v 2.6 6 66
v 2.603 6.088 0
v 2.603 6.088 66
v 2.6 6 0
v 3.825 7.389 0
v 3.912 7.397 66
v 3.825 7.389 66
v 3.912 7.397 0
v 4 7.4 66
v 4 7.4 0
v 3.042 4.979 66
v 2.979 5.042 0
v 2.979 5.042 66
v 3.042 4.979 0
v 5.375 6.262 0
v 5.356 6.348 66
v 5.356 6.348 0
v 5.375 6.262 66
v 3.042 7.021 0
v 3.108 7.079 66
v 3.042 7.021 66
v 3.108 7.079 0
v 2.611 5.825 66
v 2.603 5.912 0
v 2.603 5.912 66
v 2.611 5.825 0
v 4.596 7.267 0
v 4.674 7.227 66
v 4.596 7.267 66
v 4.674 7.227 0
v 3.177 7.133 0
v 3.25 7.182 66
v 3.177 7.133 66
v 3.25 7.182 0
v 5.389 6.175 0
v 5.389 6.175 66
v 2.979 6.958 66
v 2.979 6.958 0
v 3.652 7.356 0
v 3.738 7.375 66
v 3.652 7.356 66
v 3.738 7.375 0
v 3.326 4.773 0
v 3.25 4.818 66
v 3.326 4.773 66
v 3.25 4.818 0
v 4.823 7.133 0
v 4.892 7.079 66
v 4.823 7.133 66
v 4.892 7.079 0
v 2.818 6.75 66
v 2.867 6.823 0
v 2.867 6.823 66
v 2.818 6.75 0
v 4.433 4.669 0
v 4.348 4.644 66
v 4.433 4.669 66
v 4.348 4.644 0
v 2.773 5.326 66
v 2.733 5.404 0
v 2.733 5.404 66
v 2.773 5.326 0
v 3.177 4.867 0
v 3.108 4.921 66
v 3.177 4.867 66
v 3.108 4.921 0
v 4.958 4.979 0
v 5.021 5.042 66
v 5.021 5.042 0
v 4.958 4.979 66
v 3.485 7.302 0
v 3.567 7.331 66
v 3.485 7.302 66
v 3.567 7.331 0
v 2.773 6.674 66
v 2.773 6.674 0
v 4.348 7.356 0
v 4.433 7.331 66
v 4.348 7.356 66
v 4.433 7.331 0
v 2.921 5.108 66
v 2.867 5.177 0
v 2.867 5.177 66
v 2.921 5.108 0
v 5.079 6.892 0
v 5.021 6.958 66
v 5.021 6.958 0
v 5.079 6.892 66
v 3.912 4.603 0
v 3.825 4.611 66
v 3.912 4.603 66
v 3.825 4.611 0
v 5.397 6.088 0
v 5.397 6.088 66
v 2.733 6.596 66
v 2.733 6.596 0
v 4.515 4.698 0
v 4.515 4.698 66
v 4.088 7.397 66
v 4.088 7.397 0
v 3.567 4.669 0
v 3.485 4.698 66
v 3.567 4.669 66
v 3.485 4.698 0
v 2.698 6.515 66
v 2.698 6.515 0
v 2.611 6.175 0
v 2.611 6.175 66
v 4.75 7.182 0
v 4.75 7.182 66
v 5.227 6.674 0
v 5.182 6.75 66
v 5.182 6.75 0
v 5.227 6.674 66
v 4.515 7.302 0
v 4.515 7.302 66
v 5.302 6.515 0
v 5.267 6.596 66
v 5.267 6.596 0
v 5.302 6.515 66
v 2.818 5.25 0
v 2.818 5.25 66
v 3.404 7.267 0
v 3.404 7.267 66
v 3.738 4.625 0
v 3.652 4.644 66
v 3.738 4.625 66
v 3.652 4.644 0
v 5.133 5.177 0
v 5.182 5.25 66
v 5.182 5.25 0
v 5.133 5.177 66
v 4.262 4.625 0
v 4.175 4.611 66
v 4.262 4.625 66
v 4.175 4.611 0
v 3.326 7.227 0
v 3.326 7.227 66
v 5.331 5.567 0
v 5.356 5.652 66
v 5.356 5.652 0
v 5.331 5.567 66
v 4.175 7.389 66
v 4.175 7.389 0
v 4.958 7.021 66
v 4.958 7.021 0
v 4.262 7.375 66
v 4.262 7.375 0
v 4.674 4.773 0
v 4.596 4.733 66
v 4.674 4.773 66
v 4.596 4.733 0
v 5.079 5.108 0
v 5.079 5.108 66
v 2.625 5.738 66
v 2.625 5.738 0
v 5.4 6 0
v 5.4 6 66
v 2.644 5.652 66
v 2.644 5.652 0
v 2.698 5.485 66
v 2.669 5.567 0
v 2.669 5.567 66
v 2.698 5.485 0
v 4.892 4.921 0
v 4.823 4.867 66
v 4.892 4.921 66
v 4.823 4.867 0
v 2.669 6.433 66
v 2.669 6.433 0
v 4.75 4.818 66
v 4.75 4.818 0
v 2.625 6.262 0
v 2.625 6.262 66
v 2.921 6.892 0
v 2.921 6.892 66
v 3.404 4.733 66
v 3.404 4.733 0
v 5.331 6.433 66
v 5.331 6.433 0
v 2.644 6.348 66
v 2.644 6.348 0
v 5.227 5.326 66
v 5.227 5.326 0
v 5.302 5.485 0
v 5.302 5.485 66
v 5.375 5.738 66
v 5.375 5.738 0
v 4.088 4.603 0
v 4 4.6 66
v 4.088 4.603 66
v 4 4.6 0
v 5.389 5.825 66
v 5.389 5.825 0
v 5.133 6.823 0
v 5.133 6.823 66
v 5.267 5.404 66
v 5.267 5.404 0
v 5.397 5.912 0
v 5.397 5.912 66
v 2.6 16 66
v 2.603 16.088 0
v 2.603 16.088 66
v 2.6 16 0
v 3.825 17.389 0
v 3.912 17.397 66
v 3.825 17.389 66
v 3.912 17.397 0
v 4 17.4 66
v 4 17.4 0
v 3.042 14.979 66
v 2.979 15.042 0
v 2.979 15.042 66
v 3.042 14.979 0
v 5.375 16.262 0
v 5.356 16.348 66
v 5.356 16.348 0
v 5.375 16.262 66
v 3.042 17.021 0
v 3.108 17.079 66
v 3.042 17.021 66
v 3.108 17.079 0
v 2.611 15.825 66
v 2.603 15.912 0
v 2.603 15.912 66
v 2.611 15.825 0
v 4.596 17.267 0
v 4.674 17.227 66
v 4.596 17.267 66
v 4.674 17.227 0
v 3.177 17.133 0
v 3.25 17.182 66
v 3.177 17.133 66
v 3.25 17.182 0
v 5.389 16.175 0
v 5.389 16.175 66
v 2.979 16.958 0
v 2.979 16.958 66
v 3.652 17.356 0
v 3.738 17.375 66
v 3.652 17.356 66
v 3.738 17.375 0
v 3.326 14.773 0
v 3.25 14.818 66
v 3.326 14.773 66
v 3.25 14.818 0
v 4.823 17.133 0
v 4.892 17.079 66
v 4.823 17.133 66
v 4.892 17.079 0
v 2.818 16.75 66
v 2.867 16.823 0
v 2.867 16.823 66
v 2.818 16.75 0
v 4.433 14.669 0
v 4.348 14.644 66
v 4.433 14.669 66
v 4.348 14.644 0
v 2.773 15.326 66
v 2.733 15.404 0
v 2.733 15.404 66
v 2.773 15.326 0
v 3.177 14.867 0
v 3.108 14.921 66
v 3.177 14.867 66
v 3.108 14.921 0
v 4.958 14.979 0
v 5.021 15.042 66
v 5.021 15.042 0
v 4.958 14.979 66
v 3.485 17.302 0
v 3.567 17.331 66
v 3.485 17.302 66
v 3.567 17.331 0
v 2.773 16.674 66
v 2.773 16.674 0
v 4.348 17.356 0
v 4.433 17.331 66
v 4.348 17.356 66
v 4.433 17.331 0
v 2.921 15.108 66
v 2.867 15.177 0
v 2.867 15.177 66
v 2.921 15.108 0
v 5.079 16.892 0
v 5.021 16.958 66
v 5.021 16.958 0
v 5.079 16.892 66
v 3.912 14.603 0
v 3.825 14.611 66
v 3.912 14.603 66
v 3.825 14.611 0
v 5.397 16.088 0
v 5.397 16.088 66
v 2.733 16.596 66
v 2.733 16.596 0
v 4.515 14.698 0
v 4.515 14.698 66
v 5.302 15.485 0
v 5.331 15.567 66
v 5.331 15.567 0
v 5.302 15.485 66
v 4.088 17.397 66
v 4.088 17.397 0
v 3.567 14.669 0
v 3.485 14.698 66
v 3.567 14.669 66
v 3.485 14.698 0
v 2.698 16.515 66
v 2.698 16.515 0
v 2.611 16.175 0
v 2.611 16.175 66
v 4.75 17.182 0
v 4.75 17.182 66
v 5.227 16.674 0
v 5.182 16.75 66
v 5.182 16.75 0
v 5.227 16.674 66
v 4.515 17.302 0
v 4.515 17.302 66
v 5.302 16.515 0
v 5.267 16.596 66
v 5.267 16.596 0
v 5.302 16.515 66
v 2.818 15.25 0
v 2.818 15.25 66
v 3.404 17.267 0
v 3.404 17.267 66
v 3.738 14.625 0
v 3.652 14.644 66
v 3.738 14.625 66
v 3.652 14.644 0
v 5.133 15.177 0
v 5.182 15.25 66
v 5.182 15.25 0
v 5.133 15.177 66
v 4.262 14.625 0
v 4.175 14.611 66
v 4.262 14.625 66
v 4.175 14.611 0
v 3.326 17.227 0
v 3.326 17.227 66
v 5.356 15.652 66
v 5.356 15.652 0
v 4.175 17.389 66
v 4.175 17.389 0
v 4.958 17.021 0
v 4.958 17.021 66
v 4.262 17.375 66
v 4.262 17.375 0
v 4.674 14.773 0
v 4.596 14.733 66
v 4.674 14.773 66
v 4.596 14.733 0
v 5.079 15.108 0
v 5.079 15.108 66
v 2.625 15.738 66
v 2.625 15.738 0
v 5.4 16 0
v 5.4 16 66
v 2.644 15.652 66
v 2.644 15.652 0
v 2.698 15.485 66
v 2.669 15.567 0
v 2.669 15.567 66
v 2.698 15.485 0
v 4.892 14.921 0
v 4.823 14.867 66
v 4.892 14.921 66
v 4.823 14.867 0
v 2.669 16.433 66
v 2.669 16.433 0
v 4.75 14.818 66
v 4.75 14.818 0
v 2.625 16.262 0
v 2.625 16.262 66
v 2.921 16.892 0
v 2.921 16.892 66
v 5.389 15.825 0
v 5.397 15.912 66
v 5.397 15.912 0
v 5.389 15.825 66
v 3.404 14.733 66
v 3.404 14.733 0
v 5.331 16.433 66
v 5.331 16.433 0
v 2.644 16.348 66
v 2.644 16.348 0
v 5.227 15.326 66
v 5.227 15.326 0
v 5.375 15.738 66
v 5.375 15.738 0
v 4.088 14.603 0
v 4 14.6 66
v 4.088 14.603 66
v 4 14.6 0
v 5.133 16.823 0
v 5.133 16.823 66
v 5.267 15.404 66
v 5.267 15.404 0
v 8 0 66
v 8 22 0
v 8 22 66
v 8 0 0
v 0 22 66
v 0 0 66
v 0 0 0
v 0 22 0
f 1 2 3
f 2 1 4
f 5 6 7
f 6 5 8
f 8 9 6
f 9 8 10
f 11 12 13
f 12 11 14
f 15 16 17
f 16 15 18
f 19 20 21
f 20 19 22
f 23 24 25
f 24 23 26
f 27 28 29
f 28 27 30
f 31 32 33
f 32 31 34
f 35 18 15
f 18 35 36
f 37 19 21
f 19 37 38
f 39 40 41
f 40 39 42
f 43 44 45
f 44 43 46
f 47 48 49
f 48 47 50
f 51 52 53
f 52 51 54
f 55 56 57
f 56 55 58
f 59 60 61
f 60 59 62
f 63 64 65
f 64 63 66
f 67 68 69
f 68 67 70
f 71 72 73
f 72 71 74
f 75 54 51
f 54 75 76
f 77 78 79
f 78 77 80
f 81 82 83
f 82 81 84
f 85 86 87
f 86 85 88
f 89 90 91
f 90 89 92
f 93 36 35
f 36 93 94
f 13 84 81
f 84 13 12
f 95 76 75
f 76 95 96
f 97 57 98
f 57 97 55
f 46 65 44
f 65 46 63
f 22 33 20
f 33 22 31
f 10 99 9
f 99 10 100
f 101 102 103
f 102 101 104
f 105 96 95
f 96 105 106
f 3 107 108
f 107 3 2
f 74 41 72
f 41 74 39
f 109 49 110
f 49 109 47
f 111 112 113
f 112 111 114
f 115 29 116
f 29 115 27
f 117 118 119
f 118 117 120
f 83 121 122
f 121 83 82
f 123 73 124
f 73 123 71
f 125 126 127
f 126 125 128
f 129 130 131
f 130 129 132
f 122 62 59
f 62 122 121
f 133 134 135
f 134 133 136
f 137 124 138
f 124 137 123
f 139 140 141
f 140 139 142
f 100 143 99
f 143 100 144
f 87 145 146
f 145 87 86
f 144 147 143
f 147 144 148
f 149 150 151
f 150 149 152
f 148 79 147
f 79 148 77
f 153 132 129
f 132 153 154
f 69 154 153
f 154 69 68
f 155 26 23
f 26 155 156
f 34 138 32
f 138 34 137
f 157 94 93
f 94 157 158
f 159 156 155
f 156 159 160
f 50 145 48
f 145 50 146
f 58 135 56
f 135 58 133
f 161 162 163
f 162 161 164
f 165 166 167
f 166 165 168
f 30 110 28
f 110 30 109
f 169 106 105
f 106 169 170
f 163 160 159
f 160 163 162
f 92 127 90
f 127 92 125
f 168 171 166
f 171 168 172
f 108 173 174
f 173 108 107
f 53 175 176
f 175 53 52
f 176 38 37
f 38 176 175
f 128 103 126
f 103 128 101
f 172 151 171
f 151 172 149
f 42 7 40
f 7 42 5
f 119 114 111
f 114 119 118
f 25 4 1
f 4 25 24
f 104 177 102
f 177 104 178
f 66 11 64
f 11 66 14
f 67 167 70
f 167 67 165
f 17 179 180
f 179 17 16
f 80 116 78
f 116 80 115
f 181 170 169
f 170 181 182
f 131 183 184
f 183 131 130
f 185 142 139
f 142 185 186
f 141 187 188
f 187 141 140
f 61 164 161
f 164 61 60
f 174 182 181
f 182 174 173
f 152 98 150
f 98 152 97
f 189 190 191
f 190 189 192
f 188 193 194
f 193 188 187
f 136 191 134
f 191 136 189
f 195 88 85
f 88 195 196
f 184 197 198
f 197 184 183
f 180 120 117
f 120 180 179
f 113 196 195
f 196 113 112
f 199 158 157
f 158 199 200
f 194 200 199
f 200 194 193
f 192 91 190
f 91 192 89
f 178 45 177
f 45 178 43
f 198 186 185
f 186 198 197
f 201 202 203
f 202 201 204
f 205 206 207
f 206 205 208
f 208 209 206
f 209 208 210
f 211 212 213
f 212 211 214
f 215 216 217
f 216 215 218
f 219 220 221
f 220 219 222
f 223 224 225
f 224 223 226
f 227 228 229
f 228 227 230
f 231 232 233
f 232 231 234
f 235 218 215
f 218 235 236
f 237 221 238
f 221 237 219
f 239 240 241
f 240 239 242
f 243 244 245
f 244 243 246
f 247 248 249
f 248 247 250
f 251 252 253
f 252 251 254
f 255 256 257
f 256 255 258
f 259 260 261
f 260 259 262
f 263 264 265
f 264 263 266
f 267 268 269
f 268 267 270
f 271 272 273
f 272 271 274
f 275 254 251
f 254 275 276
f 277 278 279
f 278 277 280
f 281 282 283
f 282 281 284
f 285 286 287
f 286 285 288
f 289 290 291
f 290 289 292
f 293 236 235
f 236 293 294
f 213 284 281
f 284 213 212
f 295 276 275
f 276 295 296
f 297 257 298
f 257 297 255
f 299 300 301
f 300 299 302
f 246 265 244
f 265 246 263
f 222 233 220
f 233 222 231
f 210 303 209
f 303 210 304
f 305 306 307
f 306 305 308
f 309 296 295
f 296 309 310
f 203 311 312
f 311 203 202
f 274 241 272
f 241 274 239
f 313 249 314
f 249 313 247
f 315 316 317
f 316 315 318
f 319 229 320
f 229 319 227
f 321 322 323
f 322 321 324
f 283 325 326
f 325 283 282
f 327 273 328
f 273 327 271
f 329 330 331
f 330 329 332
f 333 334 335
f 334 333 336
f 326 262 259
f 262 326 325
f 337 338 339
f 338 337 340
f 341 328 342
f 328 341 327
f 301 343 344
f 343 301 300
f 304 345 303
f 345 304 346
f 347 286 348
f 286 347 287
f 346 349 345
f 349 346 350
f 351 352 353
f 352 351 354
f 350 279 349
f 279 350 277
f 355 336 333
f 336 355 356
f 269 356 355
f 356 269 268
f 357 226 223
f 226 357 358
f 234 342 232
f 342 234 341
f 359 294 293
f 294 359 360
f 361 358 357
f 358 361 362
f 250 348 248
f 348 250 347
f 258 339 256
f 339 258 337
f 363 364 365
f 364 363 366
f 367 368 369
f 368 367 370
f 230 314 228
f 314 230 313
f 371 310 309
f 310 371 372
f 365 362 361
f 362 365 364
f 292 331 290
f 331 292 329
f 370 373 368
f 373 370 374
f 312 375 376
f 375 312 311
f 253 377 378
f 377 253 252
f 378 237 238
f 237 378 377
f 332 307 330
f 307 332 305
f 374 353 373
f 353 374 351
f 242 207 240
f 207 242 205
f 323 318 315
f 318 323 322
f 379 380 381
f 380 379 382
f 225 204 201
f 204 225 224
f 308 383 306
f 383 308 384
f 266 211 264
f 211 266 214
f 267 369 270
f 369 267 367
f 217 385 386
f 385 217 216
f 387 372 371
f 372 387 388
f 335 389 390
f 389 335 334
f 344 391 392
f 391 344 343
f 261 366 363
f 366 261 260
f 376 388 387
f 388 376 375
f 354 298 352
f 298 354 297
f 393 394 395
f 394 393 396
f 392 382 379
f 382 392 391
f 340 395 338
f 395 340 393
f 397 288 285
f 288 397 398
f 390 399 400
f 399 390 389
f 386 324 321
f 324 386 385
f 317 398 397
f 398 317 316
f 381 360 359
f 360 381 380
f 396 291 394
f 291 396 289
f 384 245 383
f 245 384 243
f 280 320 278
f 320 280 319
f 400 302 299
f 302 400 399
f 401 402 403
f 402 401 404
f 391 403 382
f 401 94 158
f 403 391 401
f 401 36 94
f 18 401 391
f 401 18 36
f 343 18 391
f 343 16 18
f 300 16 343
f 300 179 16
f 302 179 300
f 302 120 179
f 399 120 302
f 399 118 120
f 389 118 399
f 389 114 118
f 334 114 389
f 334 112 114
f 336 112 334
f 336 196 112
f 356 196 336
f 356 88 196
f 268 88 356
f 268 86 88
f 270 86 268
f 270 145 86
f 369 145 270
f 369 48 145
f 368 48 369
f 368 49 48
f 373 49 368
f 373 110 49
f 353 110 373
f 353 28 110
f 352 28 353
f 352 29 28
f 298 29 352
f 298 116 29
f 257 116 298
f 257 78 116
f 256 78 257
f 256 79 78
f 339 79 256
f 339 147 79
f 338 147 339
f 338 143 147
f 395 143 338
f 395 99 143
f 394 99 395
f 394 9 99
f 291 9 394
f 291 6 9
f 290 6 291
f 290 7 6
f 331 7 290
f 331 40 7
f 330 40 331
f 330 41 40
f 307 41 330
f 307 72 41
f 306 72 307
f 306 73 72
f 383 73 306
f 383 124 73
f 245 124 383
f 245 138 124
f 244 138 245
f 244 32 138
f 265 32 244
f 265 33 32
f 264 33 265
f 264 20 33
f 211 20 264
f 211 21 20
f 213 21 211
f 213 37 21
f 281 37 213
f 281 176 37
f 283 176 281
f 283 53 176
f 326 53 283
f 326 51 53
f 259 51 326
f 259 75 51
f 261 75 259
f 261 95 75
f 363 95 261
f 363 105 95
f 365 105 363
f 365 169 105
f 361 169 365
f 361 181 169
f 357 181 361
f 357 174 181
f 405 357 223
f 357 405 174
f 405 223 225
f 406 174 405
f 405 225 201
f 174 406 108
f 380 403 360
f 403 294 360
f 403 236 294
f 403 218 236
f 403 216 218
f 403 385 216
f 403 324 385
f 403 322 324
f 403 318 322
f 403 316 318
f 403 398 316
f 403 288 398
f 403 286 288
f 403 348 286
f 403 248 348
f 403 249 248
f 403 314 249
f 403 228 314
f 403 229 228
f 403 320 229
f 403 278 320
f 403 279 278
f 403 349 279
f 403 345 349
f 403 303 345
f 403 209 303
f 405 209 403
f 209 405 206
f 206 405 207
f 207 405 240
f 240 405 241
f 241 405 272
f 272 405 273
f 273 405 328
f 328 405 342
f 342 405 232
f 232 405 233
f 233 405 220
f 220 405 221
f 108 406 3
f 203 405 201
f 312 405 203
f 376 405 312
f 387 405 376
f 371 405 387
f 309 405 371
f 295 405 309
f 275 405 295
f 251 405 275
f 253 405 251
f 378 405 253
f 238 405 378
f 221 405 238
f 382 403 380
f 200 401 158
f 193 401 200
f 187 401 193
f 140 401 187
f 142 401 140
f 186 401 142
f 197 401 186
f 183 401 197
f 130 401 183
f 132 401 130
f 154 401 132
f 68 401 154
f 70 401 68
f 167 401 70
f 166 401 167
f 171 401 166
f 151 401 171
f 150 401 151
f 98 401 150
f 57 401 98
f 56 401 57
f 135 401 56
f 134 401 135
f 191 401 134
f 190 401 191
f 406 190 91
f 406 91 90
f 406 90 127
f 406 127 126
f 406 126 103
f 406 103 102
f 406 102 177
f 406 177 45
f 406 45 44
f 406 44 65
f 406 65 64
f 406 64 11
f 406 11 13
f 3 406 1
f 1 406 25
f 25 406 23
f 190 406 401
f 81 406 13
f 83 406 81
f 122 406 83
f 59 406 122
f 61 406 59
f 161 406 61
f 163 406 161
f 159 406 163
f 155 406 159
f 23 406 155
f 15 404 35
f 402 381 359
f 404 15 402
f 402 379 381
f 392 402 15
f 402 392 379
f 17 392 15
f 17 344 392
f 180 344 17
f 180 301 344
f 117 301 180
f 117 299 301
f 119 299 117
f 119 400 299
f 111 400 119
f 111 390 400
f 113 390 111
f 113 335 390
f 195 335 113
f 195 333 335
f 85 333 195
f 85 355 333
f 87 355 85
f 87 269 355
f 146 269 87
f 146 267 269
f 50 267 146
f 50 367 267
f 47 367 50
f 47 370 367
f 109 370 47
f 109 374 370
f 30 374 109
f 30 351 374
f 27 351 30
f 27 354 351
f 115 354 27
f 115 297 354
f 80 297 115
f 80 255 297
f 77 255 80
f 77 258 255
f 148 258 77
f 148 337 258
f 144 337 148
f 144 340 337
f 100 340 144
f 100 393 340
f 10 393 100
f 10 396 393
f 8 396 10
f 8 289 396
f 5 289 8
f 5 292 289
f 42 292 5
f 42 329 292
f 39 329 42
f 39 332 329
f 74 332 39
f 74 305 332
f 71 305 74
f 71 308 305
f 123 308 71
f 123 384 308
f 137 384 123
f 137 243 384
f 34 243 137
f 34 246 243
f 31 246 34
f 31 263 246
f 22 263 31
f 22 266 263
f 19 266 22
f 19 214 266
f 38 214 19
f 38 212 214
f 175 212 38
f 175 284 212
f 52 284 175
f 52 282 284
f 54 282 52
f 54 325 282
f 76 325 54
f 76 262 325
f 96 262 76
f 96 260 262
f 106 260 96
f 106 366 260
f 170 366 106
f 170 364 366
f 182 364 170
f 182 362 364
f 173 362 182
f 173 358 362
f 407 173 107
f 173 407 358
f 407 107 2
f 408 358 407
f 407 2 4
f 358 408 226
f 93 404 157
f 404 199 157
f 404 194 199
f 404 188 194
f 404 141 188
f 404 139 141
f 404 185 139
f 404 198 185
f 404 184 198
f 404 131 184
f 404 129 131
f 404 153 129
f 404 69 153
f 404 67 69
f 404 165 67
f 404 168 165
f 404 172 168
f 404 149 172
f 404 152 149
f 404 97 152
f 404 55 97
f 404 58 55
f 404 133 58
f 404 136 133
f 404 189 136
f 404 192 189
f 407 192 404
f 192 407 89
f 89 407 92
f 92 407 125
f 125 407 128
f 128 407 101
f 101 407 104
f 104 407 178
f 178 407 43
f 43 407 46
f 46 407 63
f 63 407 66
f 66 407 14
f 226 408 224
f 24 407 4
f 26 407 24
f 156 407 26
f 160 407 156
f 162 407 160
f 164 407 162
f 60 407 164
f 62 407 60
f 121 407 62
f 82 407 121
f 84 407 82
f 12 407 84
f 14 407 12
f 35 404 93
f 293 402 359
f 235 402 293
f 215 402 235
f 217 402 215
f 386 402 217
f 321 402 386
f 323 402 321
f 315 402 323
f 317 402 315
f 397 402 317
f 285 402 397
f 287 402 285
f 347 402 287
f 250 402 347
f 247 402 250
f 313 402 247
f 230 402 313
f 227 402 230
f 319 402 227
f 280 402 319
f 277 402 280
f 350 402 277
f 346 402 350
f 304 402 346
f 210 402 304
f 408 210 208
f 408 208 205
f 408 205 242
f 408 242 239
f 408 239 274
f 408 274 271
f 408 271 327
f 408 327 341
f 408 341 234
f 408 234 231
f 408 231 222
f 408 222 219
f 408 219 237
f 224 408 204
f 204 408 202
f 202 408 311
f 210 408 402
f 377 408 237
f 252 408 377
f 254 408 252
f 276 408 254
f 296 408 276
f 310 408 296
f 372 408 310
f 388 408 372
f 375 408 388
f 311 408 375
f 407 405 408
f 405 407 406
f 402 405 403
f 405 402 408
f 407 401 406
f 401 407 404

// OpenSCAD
difference(){
	union(){
        
       translate([0,0,0]){
           cube([8,22,70-4], center=false);
       }

	}
	union() {

       translate([4,11-5,-1]){
            rotate(a = [0,0,90]) {
              cylinder(h=600, r=1.4, $fn=100, center=false);
            }
       }	
       translate([4,11+5,-1]){
            rotate(a = [0,0,90]) {
              cylinder(h=600, r=1.4, $fn=100, center=false);
            }
       }	

        
	}
}
